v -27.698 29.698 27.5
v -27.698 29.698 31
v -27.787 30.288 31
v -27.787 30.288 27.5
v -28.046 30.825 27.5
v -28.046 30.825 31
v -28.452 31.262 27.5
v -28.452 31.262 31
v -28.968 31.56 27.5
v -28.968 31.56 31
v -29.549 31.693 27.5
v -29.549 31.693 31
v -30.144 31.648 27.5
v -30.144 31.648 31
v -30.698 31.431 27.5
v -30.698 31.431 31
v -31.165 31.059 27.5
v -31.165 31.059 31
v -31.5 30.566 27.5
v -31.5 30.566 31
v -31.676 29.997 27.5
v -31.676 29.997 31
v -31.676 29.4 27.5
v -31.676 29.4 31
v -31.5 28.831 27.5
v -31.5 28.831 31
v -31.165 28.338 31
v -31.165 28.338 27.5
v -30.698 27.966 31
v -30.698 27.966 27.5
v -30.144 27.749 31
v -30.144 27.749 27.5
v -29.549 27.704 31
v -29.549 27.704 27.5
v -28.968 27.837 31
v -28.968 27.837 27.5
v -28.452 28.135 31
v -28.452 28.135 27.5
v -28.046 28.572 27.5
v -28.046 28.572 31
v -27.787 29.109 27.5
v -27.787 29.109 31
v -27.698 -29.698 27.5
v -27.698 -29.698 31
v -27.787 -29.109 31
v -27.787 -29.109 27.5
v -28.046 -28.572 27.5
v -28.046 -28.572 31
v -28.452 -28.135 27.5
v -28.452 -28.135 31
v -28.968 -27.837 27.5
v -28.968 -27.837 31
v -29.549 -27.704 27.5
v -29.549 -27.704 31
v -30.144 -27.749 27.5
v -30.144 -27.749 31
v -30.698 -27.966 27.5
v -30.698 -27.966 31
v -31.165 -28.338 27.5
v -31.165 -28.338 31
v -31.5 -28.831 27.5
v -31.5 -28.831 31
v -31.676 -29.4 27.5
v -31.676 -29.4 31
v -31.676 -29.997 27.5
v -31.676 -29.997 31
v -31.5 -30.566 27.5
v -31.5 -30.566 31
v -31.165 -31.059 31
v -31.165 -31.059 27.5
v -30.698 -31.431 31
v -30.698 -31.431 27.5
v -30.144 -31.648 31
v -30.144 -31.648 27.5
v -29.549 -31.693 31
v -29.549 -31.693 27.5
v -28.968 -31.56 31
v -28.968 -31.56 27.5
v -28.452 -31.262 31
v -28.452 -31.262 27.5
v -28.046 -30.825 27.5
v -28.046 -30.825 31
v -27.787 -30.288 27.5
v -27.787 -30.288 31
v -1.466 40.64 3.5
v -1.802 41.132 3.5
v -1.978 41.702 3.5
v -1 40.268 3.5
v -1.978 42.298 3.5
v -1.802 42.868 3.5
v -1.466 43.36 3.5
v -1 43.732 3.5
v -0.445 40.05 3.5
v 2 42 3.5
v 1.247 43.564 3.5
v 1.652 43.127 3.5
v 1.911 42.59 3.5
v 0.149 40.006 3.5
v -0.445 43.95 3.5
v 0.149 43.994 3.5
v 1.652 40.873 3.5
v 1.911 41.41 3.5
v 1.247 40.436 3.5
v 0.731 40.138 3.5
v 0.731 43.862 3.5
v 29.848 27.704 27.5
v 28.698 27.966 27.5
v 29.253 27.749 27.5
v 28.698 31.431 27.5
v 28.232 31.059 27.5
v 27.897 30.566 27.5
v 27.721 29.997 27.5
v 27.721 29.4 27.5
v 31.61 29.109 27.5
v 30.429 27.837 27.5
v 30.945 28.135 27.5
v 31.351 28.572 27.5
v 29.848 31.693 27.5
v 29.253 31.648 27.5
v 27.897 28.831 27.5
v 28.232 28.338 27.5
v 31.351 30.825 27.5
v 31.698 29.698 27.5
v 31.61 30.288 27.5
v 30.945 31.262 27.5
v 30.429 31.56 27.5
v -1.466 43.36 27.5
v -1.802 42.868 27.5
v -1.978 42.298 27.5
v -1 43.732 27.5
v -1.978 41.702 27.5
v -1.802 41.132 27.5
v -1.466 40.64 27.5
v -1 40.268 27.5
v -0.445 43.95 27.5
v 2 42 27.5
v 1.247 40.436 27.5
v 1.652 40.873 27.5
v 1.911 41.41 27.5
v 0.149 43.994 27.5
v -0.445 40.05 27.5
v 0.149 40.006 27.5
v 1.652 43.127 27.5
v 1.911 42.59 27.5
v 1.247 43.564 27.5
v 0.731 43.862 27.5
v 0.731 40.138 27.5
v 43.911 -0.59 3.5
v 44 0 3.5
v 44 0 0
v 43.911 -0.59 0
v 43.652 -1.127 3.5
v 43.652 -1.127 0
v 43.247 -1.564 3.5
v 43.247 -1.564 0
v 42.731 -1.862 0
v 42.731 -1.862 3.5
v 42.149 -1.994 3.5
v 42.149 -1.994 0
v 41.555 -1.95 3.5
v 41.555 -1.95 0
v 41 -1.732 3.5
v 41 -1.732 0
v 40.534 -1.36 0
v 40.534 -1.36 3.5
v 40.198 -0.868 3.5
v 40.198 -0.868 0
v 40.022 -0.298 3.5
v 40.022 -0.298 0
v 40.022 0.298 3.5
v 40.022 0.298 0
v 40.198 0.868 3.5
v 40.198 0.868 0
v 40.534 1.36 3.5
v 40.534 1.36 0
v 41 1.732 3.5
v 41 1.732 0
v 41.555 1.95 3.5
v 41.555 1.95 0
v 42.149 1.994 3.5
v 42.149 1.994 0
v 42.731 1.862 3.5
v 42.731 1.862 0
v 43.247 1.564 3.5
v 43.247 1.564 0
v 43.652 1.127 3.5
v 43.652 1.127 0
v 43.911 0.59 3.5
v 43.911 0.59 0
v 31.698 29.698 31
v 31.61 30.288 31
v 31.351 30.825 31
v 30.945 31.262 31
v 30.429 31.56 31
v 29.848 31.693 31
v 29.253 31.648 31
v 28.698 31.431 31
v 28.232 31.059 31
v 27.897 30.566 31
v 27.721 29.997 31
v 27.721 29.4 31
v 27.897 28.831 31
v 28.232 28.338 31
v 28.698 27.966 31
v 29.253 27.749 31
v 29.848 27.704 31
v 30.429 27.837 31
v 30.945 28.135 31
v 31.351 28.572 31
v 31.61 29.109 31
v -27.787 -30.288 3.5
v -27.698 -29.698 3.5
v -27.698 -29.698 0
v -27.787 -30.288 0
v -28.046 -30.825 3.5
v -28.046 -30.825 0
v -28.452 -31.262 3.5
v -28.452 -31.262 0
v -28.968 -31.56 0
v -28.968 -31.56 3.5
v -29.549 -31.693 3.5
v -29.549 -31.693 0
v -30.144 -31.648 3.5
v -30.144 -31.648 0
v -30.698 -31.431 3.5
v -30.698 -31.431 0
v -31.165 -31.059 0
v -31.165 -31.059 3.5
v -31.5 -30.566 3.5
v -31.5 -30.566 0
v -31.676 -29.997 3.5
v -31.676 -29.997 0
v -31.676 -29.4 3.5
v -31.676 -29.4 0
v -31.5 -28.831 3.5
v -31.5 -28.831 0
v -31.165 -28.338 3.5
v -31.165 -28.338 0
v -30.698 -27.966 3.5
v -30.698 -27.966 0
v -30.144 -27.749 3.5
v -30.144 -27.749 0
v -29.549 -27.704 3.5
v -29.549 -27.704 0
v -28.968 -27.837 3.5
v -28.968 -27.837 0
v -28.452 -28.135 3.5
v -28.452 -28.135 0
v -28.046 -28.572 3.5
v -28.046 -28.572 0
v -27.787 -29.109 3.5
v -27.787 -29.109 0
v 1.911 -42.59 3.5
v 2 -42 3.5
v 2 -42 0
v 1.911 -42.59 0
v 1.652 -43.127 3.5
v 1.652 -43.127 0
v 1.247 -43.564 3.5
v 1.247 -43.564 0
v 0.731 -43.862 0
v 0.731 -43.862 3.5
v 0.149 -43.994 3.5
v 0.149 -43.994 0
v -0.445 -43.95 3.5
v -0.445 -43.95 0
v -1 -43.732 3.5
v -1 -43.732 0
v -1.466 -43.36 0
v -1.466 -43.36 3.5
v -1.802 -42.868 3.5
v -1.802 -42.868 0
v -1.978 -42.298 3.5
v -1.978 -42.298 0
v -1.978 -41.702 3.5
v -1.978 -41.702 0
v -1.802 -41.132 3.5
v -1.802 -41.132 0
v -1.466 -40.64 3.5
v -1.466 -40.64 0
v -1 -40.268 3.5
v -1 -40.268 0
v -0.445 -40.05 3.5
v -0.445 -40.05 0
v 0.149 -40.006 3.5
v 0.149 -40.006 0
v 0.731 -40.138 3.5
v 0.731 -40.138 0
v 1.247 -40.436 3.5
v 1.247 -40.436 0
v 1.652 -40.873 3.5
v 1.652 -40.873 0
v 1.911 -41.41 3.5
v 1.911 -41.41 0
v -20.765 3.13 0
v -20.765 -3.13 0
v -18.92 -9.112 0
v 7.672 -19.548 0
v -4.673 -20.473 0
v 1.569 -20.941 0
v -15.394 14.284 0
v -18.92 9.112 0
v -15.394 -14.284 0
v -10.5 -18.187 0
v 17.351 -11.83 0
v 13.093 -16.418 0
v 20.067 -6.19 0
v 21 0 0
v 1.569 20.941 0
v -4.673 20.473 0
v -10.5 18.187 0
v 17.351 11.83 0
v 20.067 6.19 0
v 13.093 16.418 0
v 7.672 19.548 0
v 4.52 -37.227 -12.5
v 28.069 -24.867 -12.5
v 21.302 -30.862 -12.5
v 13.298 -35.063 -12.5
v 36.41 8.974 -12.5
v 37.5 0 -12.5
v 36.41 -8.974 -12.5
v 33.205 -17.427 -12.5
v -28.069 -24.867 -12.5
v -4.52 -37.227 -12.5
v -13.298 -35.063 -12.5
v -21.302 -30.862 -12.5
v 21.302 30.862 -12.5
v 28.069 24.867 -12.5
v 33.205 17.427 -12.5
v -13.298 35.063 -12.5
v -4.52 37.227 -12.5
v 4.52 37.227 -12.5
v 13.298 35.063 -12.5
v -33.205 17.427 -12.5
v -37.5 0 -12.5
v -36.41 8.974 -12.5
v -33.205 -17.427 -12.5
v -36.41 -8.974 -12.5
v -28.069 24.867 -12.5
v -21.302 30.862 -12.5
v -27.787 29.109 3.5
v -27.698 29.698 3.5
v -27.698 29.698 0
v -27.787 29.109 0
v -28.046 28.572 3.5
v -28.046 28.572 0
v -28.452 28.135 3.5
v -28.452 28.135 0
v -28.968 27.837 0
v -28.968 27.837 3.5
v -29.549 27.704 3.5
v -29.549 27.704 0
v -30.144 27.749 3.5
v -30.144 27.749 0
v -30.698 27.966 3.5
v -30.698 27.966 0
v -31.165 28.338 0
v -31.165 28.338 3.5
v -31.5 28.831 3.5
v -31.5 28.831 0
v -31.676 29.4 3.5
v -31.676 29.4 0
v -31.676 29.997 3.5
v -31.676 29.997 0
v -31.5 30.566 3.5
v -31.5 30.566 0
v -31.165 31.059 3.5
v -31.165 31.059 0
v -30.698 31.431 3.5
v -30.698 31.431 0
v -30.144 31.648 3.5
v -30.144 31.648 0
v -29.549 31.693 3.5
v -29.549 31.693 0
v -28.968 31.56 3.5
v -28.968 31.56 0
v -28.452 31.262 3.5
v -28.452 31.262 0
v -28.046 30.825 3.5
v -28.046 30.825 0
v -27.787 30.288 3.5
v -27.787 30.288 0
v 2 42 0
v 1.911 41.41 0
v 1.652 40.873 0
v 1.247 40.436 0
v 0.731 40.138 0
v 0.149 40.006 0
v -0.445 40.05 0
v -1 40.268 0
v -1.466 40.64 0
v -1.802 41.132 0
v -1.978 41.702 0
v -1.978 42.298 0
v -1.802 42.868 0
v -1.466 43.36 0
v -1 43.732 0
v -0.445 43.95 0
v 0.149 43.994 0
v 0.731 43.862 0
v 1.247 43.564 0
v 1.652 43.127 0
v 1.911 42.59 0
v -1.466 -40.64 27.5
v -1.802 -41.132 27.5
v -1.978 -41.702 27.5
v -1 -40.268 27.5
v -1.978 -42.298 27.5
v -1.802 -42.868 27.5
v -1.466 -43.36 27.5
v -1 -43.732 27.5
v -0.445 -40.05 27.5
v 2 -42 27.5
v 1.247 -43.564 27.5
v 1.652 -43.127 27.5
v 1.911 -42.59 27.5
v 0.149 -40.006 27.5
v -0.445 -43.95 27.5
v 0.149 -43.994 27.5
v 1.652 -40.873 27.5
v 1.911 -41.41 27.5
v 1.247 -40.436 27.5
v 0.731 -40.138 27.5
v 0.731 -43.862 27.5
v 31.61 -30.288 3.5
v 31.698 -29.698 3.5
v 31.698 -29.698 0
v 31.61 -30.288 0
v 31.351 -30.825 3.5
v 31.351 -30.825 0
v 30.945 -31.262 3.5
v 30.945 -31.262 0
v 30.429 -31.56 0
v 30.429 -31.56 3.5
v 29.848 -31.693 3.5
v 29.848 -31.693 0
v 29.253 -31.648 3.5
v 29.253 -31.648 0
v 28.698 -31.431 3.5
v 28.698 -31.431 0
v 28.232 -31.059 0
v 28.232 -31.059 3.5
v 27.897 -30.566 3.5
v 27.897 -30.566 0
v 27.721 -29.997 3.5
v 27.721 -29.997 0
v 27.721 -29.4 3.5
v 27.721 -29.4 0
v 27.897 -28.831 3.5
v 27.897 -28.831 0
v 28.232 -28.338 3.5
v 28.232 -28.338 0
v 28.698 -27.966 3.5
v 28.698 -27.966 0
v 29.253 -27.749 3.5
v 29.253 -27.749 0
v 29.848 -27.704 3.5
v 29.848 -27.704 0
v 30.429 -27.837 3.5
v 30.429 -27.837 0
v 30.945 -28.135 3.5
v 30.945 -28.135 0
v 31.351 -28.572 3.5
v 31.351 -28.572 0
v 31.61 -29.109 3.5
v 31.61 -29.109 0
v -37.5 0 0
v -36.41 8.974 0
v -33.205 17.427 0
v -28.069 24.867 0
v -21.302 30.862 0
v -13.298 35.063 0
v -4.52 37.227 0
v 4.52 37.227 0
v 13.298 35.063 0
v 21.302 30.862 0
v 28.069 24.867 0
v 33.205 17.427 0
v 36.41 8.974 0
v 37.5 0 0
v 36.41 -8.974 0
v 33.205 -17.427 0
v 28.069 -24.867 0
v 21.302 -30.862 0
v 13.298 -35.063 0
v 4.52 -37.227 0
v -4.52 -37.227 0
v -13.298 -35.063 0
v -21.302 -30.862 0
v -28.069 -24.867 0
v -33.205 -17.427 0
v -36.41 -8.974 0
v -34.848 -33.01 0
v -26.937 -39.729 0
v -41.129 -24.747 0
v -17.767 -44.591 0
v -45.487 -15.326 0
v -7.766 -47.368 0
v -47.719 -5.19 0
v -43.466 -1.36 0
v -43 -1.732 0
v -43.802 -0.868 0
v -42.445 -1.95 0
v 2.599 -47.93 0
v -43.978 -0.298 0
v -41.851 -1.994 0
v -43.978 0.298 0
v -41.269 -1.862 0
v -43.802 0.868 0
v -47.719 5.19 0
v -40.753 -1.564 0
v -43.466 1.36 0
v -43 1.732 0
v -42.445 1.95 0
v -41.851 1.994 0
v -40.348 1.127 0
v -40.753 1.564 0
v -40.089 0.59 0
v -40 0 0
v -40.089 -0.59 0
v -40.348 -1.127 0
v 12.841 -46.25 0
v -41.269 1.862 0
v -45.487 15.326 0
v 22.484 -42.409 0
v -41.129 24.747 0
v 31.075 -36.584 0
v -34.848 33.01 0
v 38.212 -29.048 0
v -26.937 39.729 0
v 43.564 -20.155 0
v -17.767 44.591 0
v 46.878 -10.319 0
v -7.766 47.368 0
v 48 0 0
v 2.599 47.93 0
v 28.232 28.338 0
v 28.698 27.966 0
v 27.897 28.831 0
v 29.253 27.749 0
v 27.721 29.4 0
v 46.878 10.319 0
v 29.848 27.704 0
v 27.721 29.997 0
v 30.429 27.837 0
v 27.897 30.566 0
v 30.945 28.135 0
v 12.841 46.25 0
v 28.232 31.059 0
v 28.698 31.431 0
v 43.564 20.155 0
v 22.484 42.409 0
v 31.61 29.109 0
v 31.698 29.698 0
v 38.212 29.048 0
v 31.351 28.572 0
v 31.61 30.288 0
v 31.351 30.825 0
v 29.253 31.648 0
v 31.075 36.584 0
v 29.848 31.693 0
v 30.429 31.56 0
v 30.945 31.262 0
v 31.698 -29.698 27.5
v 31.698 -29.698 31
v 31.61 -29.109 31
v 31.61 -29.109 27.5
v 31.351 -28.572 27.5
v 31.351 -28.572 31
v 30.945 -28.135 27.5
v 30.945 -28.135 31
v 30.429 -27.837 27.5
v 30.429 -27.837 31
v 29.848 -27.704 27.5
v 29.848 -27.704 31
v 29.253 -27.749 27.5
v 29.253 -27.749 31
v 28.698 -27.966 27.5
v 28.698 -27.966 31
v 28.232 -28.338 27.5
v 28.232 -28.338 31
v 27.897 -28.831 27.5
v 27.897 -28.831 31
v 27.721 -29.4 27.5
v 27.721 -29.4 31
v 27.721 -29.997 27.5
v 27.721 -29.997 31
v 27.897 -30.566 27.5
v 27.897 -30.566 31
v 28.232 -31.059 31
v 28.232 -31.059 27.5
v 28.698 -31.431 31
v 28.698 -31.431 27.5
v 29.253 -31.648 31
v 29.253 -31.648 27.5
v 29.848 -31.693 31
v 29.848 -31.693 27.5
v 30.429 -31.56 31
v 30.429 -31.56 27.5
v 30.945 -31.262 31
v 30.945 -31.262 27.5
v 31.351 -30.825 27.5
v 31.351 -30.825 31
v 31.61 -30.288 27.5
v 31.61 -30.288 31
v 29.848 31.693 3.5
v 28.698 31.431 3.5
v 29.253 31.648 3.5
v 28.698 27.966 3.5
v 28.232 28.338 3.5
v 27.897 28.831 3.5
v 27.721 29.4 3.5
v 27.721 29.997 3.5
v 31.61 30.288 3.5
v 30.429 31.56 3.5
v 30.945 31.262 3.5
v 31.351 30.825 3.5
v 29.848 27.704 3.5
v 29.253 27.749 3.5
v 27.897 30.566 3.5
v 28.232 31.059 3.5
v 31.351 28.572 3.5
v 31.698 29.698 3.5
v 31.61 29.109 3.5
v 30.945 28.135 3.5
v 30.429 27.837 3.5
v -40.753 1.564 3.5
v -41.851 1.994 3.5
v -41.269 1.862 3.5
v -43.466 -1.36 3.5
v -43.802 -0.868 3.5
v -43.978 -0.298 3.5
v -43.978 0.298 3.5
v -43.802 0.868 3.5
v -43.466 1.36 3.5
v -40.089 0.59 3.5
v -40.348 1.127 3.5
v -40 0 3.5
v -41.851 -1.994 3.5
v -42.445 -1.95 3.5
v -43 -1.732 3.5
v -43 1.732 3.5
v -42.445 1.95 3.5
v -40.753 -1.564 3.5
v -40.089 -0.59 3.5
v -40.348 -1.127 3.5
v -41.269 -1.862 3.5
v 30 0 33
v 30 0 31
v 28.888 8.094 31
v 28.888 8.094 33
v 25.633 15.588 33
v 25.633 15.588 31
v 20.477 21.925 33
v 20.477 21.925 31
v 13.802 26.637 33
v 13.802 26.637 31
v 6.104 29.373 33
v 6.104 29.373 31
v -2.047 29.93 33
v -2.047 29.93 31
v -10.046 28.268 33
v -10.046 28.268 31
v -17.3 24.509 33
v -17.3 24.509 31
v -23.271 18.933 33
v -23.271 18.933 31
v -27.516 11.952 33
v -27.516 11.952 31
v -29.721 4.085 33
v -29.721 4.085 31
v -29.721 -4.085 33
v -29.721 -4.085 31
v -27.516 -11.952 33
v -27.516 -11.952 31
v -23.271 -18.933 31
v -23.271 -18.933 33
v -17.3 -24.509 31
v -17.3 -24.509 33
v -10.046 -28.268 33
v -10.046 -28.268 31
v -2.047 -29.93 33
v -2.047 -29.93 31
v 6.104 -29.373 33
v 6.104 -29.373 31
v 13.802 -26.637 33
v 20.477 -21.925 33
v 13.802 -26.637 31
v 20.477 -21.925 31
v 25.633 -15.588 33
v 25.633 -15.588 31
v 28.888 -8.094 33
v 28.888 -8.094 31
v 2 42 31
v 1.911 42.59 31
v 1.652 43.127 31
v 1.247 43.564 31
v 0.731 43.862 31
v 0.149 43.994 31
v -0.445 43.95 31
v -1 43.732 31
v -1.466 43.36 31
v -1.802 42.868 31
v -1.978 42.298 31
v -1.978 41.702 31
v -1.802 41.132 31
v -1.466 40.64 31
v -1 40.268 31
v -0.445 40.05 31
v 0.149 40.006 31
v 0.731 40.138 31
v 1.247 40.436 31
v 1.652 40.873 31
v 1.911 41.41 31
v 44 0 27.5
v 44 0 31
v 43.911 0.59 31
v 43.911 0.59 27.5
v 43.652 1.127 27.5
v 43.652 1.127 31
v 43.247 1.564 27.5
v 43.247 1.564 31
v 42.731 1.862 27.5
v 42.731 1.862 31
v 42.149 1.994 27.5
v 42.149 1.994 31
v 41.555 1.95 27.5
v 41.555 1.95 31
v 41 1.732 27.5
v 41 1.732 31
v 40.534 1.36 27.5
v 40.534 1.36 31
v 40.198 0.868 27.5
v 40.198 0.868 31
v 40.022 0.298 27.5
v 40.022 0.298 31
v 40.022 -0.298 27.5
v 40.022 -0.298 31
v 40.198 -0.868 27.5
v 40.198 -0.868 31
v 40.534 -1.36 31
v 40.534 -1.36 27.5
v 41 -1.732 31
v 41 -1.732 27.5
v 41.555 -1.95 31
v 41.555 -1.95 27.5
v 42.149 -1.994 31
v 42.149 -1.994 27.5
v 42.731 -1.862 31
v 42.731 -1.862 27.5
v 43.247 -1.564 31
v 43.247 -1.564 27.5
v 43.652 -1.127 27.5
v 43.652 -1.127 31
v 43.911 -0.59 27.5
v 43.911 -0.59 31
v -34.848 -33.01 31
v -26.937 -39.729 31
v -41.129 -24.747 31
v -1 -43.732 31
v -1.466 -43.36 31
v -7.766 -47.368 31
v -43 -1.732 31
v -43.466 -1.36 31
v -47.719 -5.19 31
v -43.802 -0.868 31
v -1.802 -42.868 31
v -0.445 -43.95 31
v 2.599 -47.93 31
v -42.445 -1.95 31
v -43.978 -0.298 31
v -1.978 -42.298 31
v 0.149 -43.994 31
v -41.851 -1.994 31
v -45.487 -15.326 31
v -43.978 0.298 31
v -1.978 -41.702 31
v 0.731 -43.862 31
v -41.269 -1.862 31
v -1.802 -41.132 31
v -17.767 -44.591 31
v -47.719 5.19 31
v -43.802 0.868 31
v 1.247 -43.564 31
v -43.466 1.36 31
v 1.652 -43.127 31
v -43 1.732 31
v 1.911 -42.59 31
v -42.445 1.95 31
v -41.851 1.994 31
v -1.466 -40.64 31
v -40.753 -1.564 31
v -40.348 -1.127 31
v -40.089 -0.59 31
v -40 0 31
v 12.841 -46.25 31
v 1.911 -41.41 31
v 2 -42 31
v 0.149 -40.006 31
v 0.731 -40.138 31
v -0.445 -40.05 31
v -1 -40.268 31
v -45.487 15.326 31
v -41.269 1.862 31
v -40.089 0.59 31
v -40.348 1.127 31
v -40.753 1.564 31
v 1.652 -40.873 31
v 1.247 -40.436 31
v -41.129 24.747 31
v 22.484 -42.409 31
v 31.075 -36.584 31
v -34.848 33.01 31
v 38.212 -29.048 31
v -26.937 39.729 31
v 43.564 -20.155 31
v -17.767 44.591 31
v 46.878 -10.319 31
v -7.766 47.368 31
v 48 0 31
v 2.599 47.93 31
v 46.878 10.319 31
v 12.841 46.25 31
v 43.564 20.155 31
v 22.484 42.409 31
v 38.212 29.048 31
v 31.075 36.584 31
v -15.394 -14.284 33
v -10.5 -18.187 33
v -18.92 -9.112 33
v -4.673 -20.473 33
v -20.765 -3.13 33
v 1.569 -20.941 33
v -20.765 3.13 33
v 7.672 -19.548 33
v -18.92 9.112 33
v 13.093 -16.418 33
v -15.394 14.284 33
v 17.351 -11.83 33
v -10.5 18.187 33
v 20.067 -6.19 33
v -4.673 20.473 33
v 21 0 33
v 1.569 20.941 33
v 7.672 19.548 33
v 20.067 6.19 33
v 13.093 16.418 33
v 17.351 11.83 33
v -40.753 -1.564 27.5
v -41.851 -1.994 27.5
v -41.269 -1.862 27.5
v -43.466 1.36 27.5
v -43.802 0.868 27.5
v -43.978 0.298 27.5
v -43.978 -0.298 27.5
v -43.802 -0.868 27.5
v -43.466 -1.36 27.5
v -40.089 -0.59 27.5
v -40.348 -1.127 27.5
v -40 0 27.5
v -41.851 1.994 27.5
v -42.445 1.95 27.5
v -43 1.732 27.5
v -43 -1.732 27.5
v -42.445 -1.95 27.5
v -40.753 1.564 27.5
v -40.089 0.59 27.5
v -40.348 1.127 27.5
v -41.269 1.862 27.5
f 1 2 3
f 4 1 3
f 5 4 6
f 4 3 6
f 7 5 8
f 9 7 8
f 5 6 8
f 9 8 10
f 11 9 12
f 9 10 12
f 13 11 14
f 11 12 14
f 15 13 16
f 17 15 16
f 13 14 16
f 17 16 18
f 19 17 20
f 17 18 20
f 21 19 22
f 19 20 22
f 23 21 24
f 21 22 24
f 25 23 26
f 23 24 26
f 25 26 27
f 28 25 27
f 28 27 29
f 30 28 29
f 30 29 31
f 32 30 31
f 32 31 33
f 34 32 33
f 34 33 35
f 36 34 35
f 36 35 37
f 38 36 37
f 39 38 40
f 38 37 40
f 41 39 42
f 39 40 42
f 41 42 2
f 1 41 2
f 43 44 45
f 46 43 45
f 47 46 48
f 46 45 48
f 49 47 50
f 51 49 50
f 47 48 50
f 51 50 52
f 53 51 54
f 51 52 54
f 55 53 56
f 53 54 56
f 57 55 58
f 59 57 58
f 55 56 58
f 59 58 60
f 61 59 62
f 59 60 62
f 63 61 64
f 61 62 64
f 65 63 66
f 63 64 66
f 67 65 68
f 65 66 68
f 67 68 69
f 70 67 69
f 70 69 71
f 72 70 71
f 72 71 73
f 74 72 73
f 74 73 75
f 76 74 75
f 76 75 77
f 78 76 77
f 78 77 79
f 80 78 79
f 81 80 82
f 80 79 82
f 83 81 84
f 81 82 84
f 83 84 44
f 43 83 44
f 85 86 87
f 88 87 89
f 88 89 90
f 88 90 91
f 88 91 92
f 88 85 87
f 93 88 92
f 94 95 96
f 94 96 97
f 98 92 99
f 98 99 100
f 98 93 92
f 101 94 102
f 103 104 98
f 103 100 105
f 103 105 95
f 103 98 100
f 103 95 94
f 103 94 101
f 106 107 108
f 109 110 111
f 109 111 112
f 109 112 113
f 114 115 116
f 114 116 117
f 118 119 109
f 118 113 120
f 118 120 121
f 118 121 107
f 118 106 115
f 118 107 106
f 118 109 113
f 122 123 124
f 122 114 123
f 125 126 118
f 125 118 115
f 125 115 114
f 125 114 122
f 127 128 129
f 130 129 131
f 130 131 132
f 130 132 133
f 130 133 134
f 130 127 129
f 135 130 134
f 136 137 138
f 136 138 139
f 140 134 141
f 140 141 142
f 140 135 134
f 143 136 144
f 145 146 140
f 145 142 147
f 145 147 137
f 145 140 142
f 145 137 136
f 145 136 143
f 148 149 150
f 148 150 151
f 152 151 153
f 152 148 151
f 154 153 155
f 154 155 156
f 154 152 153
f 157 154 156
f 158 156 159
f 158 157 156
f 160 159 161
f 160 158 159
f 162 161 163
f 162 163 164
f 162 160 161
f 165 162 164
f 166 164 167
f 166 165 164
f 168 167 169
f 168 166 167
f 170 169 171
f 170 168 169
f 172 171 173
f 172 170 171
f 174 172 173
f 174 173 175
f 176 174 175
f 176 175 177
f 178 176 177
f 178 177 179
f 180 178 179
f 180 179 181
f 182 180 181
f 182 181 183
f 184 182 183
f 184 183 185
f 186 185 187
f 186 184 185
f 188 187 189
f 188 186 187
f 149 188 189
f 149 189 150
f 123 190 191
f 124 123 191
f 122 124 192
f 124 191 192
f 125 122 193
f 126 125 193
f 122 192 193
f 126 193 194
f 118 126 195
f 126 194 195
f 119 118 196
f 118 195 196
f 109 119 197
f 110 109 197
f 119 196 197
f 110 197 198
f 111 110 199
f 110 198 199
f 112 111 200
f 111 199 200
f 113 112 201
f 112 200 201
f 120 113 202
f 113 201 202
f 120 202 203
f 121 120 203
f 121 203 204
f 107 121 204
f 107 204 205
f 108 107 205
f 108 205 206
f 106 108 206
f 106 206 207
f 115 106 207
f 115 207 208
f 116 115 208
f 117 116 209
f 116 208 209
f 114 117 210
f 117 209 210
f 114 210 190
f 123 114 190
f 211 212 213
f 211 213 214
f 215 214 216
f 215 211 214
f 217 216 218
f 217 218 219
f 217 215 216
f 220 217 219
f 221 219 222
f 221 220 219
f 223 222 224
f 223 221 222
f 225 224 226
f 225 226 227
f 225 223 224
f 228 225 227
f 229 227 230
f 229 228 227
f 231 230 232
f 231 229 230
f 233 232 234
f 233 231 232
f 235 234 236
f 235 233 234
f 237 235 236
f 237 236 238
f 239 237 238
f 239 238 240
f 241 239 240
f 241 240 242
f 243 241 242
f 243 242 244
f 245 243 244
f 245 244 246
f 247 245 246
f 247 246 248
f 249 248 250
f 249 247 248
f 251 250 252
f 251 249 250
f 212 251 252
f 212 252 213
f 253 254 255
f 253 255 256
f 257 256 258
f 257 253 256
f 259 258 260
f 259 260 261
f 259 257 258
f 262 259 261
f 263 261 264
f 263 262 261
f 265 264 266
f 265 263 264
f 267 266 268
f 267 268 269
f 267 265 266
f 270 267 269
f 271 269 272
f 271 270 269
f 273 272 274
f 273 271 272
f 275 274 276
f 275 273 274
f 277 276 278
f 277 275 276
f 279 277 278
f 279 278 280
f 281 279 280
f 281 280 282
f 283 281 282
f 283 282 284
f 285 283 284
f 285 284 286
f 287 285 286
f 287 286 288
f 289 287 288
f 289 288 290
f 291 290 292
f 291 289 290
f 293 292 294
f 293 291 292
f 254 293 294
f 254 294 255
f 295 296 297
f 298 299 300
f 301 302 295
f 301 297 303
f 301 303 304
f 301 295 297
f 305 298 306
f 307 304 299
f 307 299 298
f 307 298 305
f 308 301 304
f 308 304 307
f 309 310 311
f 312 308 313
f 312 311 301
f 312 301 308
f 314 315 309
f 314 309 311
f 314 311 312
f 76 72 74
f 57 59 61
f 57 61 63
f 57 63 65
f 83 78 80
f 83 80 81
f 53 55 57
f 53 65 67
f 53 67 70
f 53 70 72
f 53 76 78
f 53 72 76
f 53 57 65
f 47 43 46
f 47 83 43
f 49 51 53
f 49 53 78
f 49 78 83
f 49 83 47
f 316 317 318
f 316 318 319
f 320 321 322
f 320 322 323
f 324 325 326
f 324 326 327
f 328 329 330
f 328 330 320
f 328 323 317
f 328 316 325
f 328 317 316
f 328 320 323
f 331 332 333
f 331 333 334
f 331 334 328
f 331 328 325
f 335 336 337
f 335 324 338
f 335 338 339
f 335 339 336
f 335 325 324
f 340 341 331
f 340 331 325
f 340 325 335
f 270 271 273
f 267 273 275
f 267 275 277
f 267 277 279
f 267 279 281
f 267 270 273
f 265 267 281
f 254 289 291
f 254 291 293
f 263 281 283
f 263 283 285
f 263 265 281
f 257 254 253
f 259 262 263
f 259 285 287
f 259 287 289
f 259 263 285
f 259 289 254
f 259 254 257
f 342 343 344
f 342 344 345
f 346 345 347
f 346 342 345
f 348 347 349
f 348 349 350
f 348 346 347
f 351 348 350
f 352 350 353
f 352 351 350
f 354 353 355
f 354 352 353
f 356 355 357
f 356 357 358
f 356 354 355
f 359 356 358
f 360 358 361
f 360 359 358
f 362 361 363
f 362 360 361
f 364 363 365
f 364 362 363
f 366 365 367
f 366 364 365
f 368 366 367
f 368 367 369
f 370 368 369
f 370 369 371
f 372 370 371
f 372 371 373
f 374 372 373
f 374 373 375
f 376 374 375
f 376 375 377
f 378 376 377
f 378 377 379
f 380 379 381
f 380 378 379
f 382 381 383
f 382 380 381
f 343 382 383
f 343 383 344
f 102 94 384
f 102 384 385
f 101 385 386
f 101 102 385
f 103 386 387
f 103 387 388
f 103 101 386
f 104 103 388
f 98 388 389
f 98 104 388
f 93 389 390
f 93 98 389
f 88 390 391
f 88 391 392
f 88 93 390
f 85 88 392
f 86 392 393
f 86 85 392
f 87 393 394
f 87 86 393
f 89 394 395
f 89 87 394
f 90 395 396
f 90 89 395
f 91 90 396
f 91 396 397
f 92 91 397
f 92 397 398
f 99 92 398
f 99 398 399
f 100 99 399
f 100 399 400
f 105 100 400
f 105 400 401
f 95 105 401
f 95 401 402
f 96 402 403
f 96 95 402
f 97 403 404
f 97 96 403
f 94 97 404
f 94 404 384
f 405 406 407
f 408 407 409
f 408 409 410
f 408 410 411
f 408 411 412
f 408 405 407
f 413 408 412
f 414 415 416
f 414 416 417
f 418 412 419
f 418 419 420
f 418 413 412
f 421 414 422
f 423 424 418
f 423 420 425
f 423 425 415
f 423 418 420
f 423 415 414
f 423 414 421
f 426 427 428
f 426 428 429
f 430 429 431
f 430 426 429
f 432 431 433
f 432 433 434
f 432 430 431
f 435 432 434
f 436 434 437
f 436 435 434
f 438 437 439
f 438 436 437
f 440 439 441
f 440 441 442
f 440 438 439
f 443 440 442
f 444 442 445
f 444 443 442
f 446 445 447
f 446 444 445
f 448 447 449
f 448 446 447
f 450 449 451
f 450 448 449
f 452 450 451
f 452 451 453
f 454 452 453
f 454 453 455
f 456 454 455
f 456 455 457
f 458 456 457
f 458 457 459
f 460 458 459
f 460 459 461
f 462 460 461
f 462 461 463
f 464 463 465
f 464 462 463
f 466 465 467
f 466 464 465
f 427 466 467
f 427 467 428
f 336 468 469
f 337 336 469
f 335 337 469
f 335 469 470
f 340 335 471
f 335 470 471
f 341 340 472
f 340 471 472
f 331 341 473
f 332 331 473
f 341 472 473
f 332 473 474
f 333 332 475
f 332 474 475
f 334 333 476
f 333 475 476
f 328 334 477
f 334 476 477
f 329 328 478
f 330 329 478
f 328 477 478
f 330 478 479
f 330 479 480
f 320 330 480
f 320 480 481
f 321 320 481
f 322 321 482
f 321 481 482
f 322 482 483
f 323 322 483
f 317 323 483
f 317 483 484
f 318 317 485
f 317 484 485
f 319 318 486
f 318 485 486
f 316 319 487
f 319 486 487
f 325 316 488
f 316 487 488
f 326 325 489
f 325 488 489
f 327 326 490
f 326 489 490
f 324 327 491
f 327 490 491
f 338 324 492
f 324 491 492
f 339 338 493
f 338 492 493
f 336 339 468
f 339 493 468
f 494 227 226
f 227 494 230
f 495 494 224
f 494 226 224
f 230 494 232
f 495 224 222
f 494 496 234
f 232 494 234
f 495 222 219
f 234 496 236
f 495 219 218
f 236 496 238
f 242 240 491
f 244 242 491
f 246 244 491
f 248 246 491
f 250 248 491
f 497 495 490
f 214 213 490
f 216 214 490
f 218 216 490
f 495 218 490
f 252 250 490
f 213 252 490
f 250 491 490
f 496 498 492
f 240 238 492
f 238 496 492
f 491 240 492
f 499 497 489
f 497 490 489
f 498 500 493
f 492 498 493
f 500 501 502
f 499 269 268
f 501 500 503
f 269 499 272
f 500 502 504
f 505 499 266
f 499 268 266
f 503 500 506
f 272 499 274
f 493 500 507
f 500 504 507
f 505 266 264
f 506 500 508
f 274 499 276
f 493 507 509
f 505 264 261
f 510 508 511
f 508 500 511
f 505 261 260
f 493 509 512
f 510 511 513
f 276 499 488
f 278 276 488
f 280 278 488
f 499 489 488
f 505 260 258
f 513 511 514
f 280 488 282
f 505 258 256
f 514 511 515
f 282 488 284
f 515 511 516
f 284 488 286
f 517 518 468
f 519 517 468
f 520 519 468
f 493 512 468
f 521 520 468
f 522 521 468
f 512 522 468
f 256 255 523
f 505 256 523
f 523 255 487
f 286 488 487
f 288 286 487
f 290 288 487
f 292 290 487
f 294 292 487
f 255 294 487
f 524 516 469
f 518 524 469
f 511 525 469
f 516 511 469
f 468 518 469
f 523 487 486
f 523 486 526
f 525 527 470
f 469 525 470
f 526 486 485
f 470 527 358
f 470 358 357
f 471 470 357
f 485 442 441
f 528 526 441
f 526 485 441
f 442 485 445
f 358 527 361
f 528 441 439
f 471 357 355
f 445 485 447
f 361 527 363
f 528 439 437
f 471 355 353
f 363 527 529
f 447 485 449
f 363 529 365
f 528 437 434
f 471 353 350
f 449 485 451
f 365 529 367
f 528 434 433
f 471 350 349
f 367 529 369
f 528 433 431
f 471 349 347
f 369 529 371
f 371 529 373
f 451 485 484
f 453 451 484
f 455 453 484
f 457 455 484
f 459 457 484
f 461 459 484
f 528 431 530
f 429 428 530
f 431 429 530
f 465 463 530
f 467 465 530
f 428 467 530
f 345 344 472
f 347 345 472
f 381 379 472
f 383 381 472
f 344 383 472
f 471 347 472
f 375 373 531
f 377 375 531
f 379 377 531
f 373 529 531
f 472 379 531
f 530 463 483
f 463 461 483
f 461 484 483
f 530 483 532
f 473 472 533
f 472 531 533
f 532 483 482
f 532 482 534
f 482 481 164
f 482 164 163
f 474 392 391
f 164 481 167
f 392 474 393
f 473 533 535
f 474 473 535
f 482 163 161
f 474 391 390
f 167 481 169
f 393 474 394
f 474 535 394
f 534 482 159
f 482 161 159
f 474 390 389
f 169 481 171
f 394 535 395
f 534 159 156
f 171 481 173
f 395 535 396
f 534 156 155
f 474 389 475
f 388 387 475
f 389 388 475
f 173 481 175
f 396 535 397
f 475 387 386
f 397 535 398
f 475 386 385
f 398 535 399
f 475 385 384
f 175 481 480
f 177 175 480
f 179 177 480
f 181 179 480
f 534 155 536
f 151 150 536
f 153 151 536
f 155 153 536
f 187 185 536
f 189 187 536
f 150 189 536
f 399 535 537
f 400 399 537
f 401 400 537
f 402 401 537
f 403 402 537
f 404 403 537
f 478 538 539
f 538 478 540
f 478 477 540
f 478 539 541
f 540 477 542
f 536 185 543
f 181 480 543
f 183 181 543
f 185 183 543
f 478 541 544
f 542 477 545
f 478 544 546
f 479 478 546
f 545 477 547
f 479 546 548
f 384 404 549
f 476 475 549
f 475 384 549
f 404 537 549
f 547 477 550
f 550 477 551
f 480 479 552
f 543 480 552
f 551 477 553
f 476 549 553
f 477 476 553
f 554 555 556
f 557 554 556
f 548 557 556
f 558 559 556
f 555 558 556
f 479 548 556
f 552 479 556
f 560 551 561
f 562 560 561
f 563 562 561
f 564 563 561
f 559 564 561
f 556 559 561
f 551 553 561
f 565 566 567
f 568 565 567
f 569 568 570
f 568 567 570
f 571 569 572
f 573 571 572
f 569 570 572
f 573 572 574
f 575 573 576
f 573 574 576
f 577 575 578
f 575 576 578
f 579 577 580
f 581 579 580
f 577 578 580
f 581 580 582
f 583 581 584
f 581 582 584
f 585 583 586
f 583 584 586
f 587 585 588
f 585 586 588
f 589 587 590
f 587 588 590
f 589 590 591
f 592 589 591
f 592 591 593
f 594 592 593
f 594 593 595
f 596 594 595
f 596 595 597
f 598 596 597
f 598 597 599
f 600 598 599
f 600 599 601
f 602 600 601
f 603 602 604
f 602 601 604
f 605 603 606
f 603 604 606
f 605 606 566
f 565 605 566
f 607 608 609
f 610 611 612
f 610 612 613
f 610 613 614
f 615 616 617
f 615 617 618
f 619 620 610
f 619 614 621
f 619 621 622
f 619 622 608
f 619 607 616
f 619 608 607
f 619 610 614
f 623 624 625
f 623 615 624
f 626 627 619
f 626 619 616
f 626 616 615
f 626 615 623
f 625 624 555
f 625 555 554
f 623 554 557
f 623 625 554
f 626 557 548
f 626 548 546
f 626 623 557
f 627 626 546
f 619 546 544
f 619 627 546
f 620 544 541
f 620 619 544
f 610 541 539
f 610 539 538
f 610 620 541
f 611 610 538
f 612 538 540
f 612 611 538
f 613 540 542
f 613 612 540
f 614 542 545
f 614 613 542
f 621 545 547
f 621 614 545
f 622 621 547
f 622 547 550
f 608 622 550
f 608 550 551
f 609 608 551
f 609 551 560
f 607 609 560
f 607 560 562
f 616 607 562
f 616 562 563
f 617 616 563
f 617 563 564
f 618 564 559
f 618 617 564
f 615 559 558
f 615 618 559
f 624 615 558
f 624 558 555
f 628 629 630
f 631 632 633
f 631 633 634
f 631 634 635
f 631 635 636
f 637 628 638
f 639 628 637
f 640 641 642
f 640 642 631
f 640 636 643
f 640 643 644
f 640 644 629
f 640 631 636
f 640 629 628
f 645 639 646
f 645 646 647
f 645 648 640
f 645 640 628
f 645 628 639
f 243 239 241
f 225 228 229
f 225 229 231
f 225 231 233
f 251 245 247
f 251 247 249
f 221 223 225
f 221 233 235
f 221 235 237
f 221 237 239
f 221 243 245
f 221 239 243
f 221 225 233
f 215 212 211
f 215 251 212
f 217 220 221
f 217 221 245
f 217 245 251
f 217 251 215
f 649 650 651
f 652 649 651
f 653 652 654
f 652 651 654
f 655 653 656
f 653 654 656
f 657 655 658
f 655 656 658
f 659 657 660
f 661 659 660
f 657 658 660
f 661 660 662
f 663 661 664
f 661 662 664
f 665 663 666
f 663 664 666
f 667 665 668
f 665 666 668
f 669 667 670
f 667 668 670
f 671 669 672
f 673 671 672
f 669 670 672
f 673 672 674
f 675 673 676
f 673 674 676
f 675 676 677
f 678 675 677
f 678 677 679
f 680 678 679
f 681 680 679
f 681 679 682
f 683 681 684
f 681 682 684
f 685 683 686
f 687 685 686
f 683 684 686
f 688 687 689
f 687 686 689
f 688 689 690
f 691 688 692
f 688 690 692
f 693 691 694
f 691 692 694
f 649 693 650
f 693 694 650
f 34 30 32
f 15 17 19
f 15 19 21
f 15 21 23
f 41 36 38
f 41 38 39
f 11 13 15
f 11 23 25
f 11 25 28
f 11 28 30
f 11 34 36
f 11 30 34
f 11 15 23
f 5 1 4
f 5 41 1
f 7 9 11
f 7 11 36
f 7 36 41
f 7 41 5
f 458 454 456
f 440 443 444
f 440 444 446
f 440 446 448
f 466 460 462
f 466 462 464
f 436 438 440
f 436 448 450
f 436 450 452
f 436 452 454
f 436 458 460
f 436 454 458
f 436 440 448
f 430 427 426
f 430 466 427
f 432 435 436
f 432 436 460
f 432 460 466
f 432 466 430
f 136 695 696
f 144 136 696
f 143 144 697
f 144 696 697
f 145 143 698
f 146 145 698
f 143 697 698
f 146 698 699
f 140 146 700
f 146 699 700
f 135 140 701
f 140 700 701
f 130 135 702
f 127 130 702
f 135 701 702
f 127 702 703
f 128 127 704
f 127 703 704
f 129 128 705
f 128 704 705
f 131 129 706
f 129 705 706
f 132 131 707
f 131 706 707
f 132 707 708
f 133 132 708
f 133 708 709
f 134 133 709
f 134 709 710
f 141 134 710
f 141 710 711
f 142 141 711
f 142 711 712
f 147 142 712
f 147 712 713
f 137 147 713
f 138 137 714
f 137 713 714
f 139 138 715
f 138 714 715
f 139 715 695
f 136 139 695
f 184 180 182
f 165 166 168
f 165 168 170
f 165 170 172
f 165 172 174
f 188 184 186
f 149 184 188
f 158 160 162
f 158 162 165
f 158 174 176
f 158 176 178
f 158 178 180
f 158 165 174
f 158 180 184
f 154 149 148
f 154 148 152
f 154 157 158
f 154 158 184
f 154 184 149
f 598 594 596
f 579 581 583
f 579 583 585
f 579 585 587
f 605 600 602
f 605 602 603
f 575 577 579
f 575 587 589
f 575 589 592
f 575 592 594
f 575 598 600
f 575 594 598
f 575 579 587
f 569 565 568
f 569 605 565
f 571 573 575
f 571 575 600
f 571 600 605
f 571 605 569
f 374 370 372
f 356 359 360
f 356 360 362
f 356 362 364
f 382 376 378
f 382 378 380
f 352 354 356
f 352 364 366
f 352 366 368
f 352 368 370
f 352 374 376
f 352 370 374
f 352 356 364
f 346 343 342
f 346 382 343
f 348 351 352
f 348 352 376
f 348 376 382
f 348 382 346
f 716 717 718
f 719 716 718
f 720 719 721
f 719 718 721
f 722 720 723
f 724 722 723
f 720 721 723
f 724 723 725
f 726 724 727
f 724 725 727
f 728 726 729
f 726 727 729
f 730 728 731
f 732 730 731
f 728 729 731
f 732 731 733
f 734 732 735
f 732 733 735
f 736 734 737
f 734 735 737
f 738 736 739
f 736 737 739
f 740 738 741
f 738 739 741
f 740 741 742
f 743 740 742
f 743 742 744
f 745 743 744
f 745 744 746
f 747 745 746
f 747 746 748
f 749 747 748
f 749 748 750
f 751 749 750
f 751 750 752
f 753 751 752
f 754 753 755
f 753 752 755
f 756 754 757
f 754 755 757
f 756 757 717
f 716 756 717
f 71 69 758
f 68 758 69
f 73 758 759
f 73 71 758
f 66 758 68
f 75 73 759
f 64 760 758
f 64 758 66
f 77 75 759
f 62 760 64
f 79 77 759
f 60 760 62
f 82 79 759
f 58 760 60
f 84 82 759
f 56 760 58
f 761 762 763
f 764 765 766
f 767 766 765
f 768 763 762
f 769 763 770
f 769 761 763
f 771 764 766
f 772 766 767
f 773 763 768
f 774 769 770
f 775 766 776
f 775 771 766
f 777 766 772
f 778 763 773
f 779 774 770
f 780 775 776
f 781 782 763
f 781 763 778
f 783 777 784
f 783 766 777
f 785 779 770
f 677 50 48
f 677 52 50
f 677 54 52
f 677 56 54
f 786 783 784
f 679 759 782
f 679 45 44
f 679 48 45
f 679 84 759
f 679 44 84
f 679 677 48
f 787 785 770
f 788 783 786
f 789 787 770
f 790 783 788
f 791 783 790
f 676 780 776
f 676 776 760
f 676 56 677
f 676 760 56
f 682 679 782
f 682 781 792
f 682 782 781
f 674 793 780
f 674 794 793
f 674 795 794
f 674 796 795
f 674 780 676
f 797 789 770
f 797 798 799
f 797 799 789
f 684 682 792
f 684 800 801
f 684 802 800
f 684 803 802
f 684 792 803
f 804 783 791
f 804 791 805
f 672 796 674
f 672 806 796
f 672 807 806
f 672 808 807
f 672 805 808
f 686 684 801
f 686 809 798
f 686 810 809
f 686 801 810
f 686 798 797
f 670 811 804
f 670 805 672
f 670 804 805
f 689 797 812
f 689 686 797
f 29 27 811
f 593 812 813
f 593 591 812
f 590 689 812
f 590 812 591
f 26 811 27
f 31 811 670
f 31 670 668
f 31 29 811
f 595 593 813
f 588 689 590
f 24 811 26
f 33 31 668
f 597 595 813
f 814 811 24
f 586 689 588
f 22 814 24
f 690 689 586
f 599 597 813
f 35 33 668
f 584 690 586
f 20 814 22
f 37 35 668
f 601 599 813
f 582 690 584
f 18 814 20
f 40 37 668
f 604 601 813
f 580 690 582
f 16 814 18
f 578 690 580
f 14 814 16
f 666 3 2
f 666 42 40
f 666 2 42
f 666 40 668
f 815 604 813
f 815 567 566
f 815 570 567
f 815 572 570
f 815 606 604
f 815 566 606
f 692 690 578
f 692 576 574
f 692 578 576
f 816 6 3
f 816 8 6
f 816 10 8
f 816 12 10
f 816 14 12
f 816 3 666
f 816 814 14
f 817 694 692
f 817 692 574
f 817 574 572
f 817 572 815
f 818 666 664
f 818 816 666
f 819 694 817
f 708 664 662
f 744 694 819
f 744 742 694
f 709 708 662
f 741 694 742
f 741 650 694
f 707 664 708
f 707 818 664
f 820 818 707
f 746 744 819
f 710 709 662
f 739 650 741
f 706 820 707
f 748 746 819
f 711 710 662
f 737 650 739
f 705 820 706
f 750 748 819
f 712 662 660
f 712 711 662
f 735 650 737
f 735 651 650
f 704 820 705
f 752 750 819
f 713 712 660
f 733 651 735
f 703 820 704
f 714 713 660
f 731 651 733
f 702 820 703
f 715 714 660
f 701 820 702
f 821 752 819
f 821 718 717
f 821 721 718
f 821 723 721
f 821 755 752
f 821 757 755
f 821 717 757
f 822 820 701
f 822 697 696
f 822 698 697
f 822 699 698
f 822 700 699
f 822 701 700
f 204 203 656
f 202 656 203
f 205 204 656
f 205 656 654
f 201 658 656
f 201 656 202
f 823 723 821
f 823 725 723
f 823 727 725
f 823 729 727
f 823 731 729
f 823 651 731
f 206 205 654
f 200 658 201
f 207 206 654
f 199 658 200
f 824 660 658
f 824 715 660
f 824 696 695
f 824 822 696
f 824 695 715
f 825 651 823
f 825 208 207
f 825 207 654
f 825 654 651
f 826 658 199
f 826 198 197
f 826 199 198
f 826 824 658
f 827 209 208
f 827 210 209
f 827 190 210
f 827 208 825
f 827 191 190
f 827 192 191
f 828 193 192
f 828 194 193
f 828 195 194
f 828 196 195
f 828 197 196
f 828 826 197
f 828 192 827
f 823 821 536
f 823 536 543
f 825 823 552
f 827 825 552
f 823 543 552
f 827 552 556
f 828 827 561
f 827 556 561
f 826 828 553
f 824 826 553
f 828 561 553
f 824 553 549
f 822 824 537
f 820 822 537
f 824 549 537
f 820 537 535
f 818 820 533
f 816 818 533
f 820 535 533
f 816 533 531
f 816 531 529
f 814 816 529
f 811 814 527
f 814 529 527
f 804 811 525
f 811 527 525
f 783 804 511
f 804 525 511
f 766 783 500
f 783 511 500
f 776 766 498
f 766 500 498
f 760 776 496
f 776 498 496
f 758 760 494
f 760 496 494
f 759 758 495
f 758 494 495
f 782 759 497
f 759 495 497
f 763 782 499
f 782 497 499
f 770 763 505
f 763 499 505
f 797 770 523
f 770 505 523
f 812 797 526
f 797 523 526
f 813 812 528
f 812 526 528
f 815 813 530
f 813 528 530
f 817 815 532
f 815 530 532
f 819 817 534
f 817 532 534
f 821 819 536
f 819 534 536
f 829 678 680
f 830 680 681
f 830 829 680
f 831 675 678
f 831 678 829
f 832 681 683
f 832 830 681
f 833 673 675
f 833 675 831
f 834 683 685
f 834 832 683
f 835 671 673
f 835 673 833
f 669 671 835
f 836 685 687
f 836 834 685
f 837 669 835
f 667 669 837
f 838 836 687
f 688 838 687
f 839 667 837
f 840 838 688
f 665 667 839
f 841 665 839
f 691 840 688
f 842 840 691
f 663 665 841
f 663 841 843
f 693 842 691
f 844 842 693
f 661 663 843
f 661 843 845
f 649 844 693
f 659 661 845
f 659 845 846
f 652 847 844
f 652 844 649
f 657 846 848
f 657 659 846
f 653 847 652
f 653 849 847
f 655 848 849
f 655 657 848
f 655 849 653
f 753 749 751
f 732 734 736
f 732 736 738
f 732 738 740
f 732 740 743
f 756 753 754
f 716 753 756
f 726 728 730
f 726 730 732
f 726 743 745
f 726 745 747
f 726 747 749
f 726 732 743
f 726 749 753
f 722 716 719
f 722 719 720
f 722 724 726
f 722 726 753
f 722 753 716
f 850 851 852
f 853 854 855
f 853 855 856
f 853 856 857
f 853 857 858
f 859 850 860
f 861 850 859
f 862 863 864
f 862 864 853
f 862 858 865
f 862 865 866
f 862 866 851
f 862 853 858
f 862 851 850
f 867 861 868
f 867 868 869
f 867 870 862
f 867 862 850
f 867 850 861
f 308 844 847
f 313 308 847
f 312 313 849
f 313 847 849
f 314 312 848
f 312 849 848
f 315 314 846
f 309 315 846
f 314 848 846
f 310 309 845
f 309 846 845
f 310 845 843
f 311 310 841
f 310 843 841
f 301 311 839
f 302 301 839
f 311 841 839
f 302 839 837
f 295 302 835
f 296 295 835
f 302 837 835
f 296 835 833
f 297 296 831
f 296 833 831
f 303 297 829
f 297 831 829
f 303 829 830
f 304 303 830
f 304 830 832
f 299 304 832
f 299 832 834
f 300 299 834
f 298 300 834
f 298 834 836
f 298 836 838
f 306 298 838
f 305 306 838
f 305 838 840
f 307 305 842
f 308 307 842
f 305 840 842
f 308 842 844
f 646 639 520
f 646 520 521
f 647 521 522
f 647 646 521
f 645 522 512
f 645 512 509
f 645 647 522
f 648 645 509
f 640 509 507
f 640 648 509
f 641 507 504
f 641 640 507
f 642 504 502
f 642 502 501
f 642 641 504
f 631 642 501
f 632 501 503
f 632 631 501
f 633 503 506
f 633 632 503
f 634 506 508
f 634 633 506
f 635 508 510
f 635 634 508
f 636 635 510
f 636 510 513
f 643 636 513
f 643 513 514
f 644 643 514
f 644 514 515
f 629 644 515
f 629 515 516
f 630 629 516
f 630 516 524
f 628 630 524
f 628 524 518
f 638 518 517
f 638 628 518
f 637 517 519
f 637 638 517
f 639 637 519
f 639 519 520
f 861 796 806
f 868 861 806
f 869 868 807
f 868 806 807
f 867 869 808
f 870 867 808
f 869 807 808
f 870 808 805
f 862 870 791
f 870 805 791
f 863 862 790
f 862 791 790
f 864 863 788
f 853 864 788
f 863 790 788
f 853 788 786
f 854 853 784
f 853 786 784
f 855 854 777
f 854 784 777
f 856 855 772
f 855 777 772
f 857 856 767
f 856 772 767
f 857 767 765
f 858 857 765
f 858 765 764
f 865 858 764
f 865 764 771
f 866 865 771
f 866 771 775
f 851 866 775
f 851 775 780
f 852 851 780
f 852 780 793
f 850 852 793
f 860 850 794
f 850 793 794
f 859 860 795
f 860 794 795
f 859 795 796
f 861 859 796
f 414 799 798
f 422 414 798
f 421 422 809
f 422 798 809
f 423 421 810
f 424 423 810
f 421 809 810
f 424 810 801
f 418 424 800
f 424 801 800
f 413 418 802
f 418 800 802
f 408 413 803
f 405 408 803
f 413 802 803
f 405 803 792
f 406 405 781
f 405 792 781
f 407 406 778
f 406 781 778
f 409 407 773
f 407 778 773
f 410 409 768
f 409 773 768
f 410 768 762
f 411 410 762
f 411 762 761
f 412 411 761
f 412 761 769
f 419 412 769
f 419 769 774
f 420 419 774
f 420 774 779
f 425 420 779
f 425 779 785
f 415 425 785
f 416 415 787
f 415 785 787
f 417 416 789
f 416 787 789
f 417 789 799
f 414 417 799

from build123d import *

# Parameters (mm, degrees)
SKETCH3_R           = 48
BOSS_EXTRUDE1_DEPTH = 31
SKETCH4_R           = 2
CUT_EXTRUDE1_DEPTH  = 3.5
SKETCH5_R           = 30
BOSS_EXTRUDE2_DEPTH = 2
SKETCH7_R           = 37.5
BOSS_EXTRUDE3_DEPTH = 12.5
SKETCH6_R           = 21
CUT_EXTRUDE3_DEPTH  = 33
CUT_EXTRUDE4_START  = -3.5
SKETCH8_R           = 2
CUT_EXTRUDE4_DEPTH  = 3.5


with BuildPart() as part:
    # Sketch3 → Boss-Extrude1 (new body)
    with BuildSketch(Plane.XY):
        Circle(SKETCH3_R)
    extrude(amount=BOSS_EXTRUDE1_DEPTH)

    # Sketch4 → Cut-Extrude1 (cut)
    with BuildSketch(Plane.XY.offset(31)):
        with Locations((0, 42)):
            Circle(SKETCH4_R)
        with Locations((29.69848481, 29.69848481)):
            Circle(SKETCH4_R)
        with Locations((42, 0)):
            Circle(SKETCH4_R)
        with Locations((29.69848481, -29.69848481)):
            Circle(SKETCH4_R)
        with Locations((0, -42)):
            Circle(SKETCH4_R)
        with Locations((-29.69848481, -29.69848481)):
            Circle(SKETCH4_R)
        with Locations((-42, 0)):
            Circle(SKETCH4_R)
        with Locations((-29.69848481, 29.69848481)):
            Circle(SKETCH4_R)
    extrude(amount=-CUT_EXTRUDE1_DEPTH, mode=Mode.SUBTRACT)

    # Sketch5 → Boss-Extrude2 (add)
    with BuildSketch(Plane.XY.offset(31)):
        Circle(SKETCH5_R)
    extrude(amount=BOSS_EXTRUDE2_DEPTH)

    # Sketch7 → Boss-Extrude3 (add)
    with BuildSketch(Plane(origin=(0, 0, 0), x_dir=(-1, 0, 0), z_dir=(0, 0, -1))):
        Circle(SKETCH7_R)
    extrude(amount=BOSS_EXTRUDE3_DEPTH)

    # Sketch6 → Cut-Extrude3 (cut)
    with BuildSketch(Plane.XY.offset(33)):
        Circle(SKETCH6_R)
    extrude(amount=-CUT_EXTRUDE3_DEPTH, mode=Mode.SUBTRACT)

    # Sketch8 → Cut-Extrude4 (cut)
    with BuildSketch(Plane(origin=(0, 0, 0), x_dir=(-1, 0, 0), z_dir=(0, 0, -1)).offset(CUT_EXTRUDE4_START)):
        with Locations(Location((0, 42, 0), (0, 0, 180))):
            Circle(SKETCH8_R)
        with Locations(Location((29.69848481, 29.69848481, 0), (0, 0, 180))):
            Circle(SKETCH8_R)
        with Locations(Location((42, 0, 0), (0, 0, 180))):
            Circle(SKETCH8_R)
        with Locations(Location((29.69848481, -29.69848481, 0), (0, 0, 180))):
            Circle(SKETCH8_R)
        with Locations(Location((0, -42, 0), (0, 0, 180))):
            Circle(SKETCH8_R)
        with Locations(Location((-29.69848481, -29.69848481, 0), (0, 0, 180))):
            Circle(SKETCH8_R)
        with Locations(Location((-42, 0, 0), (0, 0, 180))):
            Circle(SKETCH8_R)
        with Locations(Location((-29.69848481, 29.69848481, 0), (0, 0, 180))):
            Circle(SKETCH8_R)
    extrude(amount=CUT_EXTRUDE4_DEPTH, mode=Mode.SUBTRACT)


solid = part.part
